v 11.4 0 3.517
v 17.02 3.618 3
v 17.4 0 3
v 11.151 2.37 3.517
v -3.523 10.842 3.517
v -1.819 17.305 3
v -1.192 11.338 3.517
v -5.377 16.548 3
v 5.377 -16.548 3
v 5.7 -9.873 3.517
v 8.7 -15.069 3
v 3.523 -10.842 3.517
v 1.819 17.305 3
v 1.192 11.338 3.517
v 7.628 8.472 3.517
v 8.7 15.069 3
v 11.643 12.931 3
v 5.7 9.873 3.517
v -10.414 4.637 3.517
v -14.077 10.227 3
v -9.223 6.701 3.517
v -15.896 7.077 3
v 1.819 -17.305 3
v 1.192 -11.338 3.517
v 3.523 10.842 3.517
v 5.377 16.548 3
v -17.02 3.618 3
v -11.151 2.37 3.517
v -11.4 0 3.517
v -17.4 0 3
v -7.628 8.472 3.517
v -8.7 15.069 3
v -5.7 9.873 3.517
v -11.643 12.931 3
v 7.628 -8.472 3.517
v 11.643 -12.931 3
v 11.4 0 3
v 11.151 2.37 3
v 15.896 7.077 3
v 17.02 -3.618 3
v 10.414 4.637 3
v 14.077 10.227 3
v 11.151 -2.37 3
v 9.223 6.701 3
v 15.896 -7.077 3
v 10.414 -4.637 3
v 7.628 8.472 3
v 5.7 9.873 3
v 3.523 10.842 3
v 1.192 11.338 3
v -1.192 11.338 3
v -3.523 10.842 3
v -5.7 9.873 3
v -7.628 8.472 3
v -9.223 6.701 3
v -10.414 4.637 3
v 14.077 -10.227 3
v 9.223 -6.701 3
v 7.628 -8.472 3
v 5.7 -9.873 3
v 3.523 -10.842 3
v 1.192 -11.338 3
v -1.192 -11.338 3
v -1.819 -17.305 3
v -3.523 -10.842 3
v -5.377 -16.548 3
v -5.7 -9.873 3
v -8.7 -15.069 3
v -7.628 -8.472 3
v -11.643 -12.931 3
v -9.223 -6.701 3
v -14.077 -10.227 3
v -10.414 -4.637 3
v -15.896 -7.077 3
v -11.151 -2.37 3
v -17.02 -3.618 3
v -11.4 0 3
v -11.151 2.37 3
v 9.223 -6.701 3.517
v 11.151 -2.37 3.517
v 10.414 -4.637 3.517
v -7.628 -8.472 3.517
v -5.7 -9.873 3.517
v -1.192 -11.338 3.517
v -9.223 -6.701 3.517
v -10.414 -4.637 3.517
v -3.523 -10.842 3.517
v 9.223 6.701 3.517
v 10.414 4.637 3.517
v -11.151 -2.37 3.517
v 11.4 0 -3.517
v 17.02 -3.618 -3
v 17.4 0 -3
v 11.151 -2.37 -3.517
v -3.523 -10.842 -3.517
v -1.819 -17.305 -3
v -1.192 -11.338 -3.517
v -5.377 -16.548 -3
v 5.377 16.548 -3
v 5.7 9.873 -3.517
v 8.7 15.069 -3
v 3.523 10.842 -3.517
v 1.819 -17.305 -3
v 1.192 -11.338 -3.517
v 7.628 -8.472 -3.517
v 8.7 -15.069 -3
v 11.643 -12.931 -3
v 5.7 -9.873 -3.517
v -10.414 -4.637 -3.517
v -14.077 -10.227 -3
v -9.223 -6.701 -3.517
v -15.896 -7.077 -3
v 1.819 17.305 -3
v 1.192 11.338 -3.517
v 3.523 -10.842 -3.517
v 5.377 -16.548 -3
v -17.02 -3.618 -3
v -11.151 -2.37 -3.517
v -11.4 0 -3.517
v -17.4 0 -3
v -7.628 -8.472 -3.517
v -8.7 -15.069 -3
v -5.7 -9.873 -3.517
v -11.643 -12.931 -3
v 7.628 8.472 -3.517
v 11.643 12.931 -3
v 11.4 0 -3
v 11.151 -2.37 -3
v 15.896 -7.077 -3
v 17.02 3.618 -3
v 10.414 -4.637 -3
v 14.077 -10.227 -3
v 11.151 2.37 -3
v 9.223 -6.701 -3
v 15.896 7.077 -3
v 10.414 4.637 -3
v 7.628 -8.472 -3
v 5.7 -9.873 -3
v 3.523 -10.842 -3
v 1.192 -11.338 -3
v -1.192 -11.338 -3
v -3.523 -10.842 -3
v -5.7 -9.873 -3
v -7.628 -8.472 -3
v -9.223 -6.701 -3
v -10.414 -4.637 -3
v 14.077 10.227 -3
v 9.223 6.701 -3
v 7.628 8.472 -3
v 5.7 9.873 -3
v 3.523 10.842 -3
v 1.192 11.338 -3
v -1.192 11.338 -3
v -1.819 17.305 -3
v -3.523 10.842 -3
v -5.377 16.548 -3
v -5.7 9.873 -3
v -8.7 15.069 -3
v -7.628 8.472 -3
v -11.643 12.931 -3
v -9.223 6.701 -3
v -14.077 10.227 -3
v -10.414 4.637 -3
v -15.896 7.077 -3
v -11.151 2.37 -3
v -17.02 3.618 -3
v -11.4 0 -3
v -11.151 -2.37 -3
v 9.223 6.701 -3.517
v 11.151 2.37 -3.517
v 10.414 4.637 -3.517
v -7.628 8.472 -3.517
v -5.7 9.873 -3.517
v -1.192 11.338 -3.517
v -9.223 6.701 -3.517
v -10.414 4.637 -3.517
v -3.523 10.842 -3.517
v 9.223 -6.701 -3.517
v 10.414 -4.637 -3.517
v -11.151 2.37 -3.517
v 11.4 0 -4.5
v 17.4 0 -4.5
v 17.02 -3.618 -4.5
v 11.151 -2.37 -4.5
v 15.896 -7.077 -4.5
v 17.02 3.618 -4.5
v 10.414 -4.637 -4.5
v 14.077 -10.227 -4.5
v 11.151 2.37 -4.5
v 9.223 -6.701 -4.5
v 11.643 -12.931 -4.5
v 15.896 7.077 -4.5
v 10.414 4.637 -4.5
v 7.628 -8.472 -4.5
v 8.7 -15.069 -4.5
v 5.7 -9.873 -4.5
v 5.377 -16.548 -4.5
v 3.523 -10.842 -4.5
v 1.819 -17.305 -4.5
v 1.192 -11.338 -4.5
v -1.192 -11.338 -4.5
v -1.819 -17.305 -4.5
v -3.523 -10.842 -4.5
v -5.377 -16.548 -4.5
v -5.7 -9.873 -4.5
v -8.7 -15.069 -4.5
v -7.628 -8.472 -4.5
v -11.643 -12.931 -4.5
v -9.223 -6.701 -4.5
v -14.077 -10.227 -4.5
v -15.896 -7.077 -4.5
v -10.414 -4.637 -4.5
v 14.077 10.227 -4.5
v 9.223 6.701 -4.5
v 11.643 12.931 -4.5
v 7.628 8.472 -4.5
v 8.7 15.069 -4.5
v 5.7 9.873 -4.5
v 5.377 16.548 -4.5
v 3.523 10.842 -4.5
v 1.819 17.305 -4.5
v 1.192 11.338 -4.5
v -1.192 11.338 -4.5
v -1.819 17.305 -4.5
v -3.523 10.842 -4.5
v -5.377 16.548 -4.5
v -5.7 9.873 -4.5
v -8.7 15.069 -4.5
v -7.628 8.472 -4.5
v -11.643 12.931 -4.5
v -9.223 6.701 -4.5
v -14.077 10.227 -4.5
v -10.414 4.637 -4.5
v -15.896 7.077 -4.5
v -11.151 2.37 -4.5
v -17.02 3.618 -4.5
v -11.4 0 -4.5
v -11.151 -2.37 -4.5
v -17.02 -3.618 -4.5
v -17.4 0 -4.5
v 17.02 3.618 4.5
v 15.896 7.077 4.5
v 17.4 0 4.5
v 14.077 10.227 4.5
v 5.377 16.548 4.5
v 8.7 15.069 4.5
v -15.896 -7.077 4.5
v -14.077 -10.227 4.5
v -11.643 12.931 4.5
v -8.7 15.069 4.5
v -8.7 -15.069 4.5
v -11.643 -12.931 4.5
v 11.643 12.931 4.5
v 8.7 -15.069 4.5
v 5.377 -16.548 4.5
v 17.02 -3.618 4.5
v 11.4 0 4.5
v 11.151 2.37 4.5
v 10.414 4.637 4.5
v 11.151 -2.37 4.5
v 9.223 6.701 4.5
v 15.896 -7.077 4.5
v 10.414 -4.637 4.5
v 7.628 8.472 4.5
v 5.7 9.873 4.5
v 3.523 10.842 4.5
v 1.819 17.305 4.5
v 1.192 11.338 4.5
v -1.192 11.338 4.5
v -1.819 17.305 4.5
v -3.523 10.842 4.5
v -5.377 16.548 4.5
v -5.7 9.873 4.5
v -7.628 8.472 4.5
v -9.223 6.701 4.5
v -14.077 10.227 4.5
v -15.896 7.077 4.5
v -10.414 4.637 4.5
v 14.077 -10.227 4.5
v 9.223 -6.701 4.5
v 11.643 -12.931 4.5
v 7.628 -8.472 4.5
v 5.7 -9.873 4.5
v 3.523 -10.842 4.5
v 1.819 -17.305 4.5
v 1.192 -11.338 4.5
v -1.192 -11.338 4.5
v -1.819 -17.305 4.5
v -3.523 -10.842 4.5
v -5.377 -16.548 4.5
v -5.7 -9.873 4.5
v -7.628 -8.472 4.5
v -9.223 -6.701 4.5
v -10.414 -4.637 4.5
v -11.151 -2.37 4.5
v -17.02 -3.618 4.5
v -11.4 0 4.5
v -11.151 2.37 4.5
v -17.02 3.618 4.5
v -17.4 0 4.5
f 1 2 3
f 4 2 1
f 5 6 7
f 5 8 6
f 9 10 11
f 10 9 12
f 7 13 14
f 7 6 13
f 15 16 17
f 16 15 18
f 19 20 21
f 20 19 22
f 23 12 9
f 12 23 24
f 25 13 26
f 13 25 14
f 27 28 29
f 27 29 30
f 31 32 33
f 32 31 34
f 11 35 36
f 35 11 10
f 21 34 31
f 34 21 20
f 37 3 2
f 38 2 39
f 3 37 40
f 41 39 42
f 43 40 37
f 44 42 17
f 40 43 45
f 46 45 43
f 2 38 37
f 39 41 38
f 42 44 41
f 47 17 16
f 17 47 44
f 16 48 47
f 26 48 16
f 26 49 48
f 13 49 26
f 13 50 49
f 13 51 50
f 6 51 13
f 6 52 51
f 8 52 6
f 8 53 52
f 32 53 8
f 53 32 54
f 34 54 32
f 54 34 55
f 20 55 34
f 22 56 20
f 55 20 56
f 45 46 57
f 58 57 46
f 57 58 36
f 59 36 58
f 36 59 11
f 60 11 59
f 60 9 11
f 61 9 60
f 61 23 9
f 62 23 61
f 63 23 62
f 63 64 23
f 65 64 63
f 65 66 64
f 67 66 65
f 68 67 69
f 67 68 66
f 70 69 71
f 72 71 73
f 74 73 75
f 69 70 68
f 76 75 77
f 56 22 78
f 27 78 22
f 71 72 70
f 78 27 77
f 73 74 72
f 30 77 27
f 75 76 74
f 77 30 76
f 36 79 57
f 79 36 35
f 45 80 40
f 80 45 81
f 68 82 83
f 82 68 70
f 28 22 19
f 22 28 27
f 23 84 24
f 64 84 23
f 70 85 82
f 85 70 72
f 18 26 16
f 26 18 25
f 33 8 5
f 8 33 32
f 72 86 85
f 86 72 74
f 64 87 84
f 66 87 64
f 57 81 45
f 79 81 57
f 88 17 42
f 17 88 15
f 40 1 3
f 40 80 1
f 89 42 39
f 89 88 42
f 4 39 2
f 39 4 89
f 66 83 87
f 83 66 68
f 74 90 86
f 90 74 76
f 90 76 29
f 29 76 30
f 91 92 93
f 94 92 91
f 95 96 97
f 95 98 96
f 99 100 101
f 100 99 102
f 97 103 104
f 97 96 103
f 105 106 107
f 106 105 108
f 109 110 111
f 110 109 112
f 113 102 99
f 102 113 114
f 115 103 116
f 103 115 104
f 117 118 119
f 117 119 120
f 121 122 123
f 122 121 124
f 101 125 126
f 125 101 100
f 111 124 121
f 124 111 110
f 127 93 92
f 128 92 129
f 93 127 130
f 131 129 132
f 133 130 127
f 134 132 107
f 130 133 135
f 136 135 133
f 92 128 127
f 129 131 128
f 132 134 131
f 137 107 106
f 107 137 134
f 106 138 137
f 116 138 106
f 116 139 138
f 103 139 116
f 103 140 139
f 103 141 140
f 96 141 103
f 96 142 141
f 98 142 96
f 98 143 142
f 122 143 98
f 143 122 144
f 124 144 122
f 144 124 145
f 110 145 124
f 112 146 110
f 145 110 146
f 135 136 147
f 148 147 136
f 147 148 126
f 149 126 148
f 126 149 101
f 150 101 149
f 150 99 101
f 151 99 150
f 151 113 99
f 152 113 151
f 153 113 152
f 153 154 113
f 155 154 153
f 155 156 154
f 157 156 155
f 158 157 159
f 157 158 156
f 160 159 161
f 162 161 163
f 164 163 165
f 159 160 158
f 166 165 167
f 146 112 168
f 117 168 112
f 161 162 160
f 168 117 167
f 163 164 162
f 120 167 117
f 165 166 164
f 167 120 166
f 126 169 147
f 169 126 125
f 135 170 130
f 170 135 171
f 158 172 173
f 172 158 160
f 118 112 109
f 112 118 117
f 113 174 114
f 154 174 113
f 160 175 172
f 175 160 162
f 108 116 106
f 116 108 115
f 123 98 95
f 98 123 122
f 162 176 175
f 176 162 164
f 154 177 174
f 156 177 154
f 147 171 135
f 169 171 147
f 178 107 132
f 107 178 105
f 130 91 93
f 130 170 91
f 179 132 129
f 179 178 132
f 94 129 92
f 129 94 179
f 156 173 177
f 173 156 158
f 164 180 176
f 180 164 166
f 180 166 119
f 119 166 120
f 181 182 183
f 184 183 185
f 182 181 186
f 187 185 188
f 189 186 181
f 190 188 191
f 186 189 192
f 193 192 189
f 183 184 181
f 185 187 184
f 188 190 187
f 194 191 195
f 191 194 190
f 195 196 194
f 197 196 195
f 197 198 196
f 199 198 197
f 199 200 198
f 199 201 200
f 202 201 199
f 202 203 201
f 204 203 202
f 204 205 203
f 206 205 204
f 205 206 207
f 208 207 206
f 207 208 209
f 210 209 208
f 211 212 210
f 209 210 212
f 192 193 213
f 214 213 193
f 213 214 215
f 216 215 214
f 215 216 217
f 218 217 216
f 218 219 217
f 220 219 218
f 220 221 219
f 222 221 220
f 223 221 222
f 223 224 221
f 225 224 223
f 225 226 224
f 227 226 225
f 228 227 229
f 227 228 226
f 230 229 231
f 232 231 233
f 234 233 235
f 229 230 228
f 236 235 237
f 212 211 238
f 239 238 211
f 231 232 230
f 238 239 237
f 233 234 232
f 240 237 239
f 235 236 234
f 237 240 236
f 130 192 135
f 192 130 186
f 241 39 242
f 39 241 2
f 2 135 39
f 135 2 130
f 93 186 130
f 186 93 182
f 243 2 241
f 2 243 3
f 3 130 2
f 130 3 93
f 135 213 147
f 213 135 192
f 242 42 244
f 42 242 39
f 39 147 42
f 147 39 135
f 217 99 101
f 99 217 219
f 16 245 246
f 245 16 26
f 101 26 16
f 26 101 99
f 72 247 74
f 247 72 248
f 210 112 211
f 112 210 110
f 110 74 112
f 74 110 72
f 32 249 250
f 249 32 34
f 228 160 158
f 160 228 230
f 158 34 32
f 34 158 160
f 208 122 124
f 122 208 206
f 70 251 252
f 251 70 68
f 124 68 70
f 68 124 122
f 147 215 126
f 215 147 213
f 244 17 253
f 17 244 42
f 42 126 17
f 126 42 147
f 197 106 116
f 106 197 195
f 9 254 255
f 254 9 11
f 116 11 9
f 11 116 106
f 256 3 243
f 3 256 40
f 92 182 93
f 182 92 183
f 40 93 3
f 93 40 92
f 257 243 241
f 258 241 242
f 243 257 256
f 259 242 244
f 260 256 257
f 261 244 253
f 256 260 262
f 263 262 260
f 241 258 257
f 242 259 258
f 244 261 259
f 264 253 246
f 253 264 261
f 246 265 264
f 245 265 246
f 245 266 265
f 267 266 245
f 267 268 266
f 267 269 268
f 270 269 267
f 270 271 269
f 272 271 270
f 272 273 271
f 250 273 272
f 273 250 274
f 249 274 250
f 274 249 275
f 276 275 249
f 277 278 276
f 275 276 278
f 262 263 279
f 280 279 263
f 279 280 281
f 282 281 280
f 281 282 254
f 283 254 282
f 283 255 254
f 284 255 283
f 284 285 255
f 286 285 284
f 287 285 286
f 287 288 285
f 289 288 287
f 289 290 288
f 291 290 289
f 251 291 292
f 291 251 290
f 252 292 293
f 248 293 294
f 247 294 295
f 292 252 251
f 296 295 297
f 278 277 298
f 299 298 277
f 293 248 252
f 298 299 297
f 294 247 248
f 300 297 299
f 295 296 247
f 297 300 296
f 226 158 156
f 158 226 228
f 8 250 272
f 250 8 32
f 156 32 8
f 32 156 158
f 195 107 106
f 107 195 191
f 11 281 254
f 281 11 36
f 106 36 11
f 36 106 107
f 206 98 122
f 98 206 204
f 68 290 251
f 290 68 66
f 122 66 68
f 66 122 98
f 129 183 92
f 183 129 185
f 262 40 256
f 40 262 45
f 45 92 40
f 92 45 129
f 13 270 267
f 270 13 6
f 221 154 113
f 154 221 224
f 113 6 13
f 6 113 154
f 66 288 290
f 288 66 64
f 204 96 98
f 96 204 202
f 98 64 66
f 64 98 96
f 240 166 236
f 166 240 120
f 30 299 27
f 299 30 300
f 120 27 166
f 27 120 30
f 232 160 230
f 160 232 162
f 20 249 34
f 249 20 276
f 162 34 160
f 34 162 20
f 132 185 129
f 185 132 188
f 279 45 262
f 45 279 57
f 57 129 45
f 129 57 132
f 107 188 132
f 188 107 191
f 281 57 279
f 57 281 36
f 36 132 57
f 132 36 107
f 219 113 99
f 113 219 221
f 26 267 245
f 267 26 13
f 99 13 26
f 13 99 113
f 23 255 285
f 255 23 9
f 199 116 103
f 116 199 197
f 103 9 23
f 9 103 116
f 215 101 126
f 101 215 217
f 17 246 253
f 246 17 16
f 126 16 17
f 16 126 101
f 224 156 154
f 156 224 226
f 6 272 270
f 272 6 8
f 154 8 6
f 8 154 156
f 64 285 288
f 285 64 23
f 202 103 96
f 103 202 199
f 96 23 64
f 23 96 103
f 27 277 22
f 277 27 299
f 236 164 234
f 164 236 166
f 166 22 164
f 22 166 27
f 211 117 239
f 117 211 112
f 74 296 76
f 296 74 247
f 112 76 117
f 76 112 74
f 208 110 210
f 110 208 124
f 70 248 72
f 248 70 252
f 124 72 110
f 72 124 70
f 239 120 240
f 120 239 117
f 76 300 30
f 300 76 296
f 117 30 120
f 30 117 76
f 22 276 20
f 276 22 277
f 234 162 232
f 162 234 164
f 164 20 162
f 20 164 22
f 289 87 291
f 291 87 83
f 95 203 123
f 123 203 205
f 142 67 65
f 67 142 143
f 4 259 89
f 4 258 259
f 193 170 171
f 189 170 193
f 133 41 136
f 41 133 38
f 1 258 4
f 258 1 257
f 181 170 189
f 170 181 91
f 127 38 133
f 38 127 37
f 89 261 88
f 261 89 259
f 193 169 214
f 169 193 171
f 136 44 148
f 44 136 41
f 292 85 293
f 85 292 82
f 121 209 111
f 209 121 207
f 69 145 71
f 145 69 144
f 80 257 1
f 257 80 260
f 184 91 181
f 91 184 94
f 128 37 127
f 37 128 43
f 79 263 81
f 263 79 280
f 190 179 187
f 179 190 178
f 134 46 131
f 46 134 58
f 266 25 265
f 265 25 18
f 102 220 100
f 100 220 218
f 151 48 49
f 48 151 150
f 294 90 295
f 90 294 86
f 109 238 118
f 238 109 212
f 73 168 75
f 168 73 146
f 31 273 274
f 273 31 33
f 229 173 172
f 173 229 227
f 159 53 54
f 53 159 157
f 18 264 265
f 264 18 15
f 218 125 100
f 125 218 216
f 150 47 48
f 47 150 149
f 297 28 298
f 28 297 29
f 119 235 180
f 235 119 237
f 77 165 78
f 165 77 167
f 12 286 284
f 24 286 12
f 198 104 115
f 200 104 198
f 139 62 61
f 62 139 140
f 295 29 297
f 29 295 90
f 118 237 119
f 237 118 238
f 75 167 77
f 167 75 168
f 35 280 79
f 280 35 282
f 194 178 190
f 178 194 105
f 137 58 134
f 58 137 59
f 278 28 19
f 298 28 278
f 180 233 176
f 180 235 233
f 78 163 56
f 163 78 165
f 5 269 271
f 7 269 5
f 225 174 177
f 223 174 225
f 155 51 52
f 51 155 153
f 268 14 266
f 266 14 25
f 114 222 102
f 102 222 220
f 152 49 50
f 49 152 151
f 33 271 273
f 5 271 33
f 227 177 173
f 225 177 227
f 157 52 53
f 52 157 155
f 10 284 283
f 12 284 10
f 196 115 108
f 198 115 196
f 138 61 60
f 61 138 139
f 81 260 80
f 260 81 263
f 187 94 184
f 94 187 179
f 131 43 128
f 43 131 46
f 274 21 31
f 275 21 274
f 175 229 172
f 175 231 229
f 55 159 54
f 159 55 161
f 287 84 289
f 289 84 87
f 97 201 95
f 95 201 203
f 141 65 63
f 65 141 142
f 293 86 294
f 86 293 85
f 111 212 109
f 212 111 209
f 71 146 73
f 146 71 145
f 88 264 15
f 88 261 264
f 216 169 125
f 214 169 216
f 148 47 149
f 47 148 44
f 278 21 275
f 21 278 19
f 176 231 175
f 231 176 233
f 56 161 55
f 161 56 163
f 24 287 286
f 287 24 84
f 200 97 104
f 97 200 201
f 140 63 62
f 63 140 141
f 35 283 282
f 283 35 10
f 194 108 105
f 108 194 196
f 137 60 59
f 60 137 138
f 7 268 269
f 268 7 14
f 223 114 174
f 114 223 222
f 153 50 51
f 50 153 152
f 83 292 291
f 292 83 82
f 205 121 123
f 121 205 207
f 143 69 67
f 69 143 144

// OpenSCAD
// Parameters
outer_radius = 17.4; //[8.7:34.8:0.1]
inner_radius = 11.4; //[5.7:22.8:0.1]
height = 9.0; //[4.5:18.0:0.1]
wall_thickness = 0.5; //[0.25:1.0:0.05]
overlap = 1.0; //[0.5:2.0:0.1]

// Main body of the bushing
module radial_main_body() {
  color("Silver")
  cylinder(r=outer_radius, h=height, center=true);
}

// Inner bore subtraction
module inner_bore() {
  cylinder(r=inner_radius, h=height + 2*overlap, center=true);
}

// Edge chamfer cuts
module edge_chamfer_top_cut() {
  translate([0, 0, height/2 - (wall_thickness + overlap)/2])
    cylinder(r1=outer_radius, r2=0, h=wall_thickness + overlap, center=true);
}

module edge_chamfer_bottom_cut() {
  translate([0, 0, -height/2 + (wall_thickness + overlap)/2])
    rotate([180, 0, 0])
    cylinder(r1=outer_radius, r2=0, h=wall_thickness + overlap, center=true);
}

// Union of edge chamfers
module edge_chamfers_fillets() {
  union() {
    edge_chamfer_top_cut();
    edge_chamfer_bottom_cut();
  }
}

// Final model with all operations applied
module final_model() {
  difference() {
    radial_main_body();
    inner_bore();
    edge_chamfers_fillets();
  }
}

// Render the final model
final_model();
